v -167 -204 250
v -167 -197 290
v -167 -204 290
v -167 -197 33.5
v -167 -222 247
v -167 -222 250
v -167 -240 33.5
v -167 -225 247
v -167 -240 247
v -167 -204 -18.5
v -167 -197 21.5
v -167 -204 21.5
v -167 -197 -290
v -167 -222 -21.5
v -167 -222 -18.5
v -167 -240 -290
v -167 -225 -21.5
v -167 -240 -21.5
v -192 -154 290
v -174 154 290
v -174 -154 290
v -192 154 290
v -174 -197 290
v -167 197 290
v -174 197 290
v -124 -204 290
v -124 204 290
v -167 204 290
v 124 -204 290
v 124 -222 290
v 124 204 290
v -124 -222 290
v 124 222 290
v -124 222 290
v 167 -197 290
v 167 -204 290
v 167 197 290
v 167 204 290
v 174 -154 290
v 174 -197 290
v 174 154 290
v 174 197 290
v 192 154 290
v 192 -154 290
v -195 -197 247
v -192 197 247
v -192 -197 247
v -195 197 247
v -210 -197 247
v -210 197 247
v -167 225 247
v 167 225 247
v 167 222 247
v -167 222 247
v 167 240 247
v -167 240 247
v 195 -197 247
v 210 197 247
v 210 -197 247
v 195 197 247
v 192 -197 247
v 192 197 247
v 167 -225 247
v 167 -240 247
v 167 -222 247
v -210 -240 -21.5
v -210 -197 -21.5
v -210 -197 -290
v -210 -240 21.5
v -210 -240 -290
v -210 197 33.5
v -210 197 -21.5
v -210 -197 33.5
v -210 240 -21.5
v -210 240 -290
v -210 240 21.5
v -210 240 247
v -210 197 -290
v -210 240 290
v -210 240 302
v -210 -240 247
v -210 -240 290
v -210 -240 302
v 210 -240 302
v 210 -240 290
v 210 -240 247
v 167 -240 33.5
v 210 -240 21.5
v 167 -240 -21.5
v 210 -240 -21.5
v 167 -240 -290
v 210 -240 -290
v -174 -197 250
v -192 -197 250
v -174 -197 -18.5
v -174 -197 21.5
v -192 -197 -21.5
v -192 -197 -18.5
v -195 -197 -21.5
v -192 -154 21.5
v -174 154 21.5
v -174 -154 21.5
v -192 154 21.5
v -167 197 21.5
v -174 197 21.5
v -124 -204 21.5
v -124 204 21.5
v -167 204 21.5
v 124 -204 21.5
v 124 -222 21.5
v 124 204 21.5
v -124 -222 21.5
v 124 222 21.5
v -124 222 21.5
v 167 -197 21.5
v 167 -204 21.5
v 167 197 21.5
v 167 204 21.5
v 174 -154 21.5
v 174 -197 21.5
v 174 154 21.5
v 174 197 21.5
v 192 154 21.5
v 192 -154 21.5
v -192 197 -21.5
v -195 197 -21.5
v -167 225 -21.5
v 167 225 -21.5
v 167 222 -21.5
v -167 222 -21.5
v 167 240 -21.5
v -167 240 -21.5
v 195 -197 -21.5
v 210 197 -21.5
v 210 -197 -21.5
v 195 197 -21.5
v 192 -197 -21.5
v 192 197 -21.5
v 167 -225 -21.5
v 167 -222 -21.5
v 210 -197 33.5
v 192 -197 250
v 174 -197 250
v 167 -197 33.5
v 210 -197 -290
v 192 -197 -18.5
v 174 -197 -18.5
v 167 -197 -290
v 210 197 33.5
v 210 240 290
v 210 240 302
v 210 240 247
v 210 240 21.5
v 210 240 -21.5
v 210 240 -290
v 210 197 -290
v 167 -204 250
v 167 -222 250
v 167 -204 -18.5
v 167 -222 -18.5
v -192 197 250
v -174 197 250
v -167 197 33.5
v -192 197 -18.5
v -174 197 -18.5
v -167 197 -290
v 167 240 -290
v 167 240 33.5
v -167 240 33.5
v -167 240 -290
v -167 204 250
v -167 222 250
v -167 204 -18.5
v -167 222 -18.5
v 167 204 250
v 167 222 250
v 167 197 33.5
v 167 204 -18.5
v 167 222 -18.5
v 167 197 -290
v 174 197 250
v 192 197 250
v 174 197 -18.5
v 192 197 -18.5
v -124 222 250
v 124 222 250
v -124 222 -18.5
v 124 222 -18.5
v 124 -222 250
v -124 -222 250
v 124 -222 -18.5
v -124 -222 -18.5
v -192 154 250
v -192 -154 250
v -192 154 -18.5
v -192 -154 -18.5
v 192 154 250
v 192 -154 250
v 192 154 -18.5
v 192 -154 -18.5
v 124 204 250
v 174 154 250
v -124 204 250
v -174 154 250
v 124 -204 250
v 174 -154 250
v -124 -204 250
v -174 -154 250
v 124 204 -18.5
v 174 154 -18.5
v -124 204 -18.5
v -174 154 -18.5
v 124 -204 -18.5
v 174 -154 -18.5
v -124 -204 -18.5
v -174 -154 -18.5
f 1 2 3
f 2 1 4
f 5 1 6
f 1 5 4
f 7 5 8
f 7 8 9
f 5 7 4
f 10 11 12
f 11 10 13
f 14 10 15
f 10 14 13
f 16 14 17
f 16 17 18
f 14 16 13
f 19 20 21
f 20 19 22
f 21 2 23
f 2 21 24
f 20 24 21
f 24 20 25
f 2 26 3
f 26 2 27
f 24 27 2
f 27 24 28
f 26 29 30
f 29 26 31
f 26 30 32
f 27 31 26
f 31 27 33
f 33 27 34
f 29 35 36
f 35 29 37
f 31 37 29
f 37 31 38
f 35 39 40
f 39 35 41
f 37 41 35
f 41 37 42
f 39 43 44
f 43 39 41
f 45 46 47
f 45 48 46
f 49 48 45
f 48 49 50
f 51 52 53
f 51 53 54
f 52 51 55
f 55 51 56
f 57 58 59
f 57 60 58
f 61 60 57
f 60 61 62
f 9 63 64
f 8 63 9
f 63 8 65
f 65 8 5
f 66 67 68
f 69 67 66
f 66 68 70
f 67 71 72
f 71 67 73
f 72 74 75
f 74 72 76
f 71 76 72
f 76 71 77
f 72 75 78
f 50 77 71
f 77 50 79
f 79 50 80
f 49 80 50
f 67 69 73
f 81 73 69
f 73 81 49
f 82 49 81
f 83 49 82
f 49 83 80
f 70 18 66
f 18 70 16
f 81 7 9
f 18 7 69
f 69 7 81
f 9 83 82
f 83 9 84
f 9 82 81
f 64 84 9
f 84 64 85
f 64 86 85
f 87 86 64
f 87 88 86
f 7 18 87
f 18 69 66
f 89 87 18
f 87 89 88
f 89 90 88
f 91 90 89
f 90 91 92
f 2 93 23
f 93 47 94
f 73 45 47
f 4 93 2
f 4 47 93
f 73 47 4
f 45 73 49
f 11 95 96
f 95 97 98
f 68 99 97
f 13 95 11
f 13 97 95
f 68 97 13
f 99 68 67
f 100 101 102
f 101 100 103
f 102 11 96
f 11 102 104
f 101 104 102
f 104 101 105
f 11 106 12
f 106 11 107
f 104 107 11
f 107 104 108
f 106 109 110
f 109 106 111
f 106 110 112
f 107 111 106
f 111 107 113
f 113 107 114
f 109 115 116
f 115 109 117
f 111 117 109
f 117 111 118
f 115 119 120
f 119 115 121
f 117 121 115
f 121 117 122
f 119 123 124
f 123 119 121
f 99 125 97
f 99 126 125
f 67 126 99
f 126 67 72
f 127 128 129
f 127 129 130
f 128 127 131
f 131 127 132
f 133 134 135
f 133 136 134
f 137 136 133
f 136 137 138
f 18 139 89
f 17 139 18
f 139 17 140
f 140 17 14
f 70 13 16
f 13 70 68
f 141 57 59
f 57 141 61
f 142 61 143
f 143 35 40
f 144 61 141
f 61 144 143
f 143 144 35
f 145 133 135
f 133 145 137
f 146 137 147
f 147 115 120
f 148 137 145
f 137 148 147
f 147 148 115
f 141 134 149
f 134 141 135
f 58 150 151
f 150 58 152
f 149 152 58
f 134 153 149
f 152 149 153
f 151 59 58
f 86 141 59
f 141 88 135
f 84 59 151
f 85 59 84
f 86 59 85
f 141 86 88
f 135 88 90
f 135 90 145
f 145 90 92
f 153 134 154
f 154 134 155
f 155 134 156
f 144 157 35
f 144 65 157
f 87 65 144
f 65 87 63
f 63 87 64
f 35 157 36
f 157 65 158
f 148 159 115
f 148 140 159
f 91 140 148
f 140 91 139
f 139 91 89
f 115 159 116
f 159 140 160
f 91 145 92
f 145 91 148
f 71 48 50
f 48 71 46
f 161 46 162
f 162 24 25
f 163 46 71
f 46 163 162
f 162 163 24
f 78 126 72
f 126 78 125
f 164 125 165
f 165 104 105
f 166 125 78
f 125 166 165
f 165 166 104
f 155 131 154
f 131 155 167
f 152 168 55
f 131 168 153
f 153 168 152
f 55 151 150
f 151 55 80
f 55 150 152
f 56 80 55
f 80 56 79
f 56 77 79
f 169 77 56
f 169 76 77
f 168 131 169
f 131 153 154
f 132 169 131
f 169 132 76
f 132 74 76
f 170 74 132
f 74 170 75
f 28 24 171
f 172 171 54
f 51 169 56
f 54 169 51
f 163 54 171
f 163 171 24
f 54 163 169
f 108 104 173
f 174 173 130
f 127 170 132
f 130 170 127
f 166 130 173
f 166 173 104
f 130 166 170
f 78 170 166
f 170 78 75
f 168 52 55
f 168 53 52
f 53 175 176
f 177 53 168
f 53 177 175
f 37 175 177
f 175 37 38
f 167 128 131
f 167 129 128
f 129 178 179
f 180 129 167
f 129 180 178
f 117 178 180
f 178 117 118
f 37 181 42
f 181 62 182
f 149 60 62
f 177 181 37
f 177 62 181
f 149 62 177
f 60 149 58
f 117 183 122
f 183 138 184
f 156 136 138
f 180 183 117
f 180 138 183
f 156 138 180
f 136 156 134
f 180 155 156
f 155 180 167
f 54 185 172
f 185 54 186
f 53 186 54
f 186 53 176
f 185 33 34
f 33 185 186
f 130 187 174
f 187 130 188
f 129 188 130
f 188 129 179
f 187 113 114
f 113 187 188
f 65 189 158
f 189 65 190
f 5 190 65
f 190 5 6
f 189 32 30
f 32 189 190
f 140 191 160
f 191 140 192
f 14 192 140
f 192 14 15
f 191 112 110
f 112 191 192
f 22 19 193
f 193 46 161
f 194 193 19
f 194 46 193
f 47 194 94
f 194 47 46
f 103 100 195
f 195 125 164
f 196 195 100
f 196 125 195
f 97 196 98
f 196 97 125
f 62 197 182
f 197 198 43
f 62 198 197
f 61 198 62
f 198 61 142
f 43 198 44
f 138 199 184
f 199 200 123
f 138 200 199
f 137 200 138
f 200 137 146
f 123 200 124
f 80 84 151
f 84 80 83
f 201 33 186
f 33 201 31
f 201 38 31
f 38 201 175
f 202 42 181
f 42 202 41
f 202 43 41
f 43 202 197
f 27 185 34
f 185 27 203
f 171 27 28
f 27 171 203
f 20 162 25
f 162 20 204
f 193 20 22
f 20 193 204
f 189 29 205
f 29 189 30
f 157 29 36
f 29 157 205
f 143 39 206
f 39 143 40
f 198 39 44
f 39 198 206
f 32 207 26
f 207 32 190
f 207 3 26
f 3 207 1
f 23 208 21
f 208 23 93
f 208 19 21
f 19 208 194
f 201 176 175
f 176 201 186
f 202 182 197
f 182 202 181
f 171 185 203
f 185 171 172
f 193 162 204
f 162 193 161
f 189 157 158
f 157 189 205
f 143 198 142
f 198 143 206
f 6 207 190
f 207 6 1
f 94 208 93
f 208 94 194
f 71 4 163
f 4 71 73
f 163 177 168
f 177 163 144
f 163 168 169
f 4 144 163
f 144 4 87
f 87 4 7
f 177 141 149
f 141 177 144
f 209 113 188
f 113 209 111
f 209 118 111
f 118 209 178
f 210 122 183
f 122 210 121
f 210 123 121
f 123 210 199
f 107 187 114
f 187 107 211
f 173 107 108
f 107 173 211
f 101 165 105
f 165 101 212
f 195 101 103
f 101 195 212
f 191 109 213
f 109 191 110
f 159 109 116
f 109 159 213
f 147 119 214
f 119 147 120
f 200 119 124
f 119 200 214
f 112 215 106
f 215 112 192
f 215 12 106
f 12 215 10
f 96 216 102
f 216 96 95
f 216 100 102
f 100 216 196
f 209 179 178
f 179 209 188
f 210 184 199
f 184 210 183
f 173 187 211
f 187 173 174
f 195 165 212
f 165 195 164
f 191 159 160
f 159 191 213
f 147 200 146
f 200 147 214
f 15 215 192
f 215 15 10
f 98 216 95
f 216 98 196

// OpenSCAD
// file: shelf.scad
module shelf(table_width,table_depth,shelf_thickness,strut_timber_width,strut_timber_depth,leg_timber_width, lap_depth,brace_length)
{
    difference()
    {
      cube([table_width,table_depth,shelf_thickness],true);
    	
    	//Corner cutouts
    	//Back Right
    	translate([table_width/2-leg_timber_width/2,
    						 table_depth/2-leg_timber_width/2,
    						 0])
    	{
    		#cube([leg_timber_width,leg_timber_width,shelf_thickness],true);
    	}

    	//Back Left    	
    	translate([(table_width/2-leg_timber_width/2)*-1,
    							table_depth/2-leg_timber_width/2,
    							0])
    	{
    		#cube([leg_timber_width,leg_timber_width,shelf_thickness],true);
    	}    
    	
    	//Front Right
    	translate([table_width/2-leg_timber_width/2,
    						 (table_depth/2-leg_timber_width/2)*-1,
    						 0])
    	{
    		#cube([leg_timber_width,leg_timber_width,shelf_thickness],true);
    	}    	

    	//Front Left
    	translate([(table_width/2-leg_timber_width/2)*-1,
    						 (table_depth/2-leg_timber_width/2)*-1,0])
    	{
    		#cube([leg_timber_width,leg_timber_width,shelf_thickness],true);
    	}
    	
    	//Back Right - x-parallel
    	translate([table_width/2 - brace_length/2 - leg_timber_width,
    						table_depth/2 - strut_timber_depth/2 - strut_timber_depth,
    						-shelf_thickness/2 + shelf_thickness/4/2])
    	{
				cube([brace_length,strut_timber_depth,shelf_thickness/4],true);
			}
			
			//Back right y-parallel
		  translate([table_width/2 - strut_timber_depth/2 - strut_timber_depth,
    						table_depth/2 - brace_length/2 - leg_timber_width,
    						-shelf_thickness/2 + shelf_thickness/4/2])
    	{
				cube([strut_timber_depth,brace_length,shelf_thickness/4],true);
			}
			
			
			//Back Left - x-parallel
    	translate([(table_width/2 - brace_length/2 - leg_timber_width)*-1,
    						table_depth/2 - strut_timber_depth/2 - strut_timber_depth,
    						-shelf_thickness/2 + shelf_thickness/4/2])
    	{
				cube([brace_length,strut_timber_depth,shelf_thickness/4],true);
			}
			
			//Back Left y-parallel
		  translate([(table_width/2 - strut_timber_depth/2 - strut_timber_depth)*-1,
    						table_depth/2 - brace_length/2 - leg_timber_width,
    						-shelf_thickness/2 + shelf_thickness/4/2])
    	{
				cube([strut_timber_depth,brace_length,shelf_thickness/4],true);
			}
			
			
			//Front Right - x-parallel
    	translate([table_width/2 - brace_length/2 - leg_timber_width,
    						(table_depth/2 - strut_timber_depth/2 - strut_timber_depth)*-1,
    						-shelf_thickness/2 + shelf_thickness/4/2])
    	{
				cube([brace_length,strut_timber_depth,shelf_thickness/4],true);
			}
			
			//Back right y-parallel
		  translate([table_width/2 - strut_timber_depth/2 - strut_timber_depth,
    						(table_depth/2 - brace_length/2 - leg_timber_width)*-1,
    						-shelf_thickness/2 + shelf_thickness/4/2])
    	{
				cube([strut_timber_depth,brace_length,shelf_thickness/4],true);
			}
			
			
			//Front Left - x-parallel
    	translate([(table_width/2 - brace_length/2 - leg_timber_width)*-1,
    						(table_depth/2 - strut_timber_depth/2 - strut_timber_depth)*-1,
    						-shelf_thickness/2 + shelf_thickness/4/2])
    	{
				cube([brace_length,strut_timber_depth,shelf_thickness/4],true);
			}
			
			//Front Left y-parallel
		  translate([(table_width/2 - strut_timber_depth/2 - strut_timber_depth)*-1,
    						(table_depth/2 - brace_length/2 - leg_timber_width)*-1,
    						-shelf_thickness/2 + shelf_thickness/4/2])
    	{
				cube([strut_timber_depth,brace_length,shelf_thickness/4],true);
			}

		}
		
		//Back Right x-parallel
		translate([table_width/2 - brace_length/2 - leg_timber_width,
    						table_depth/2 - strut_timber_depth/2 - strut_timber_depth,
    						-strut_timber_width/2-shelf_thickness/4])
    {
			cube([brace_length,strut_timber_depth,strut_timber_width],true);
		}
		
		// Back right y-parallel
		translate([table_width/2 - strut_timber_depth/2 - strut_timber_depth,
    						table_depth/2 - brace_length/2 - leg_timber_width,
    						-strut_timber_width/2-shelf_thickness/4])
    {
			cube([strut_timber_depth,brace_length,strut_timber_width],true);
		}
		
		//Back Left x-parallel
		translate([(table_width/2 - brace_length/2 - leg_timber_width)*-1,
    						table_depth/2 - strut_timber_depth/2 - strut_timber_depth,
    						-strut_timber_width/2-shelf_thickness/4])
    {
			cube([brace_length,strut_timber_depth,strut_timber_width],true);
		}
		
		// Back Left y-parallel
		translate([(table_width/2 - strut_timber_depth/2 - strut_timber_depth)*-1,
    						table_depth/2 - brace_length/2 - leg_timber_width,
    						-strut_timber_width/2-shelf_thickness/4])
    {
			cube([strut_timber_depth,brace_length,strut_timber_width],true);
		}
		
		
		//Front Right x-parallel
		translate([table_width/2 - brace_length/2 - leg_timber_width,
    						(table_depth/2 - strut_timber_depth/2 - strut_timber_depth)*-1,
    						-strut_timber_width/2-shelf_thickness/4])
    {
			cube([brace_length,strut_timber_depth,strut_timber_width],true);
		}
		
		// Front right y-parallel
		translate([table_width/2 - strut_timber_depth/2 - strut_timber_depth,
    						(table_depth/2 - brace_length/2 - leg_timber_width)*-1,
    						-strut_timber_width/2-shelf_thickness/4])
    {
			cube([strut_timber_depth,brace_length,strut_timber_width],true);
		}
		
		//Front Left x-parallel
		translate([(table_width/2 - brace_length/2 - leg_timber_width)*-1,
    						(table_depth/2 - strut_timber_depth/2 - strut_timber_depth)*-1,
    						-strut_timber_width/2-shelf_thickness/4])
    {
			cube([brace_length,strut_timber_depth,strut_timber_width],true);
		}
		
		//Front Left y-parallel
		translate([(table_width/2 - strut_timber_depth/2 - strut_timber_depth)*-1,
    						(table_depth/2 - brace_length/2 - leg_timber_width)*-1,
    						-strut_timber_width/2-shelf_thickness/4])
    {
			cube([strut_timber_depth,brace_length,strut_timber_width],true);
		}
}
top(500,300,12,43,17,43,15,43);
// file: top.scad
module top(table_width,table_depth,shelf_thickness,strut_timber_width,strut_timber_depth,leg_timber_width, lap_depth,brace_length)
{
    difference()
    {
      cube([table_width,table_depth,shelf_thickness],true);
    	
    	//Back Right - x-parallel
    	translate([table_width/2 - brace_length/2 - leg_timber_width,
    						table_depth/2 - strut_timber_depth/2 - strut_timber_depth,
    						-shelf_thickness/2 + shelf_thickness/4/2])
    	{
				cube([brace_length,strut_timber_depth,shelf_thickness/4],true);
			}
			
			//Back right y-parallel
		  translate([table_width/2 - strut_timber_depth/2 - strut_timber_depth,
    						table_depth/2 - brace_length/2 - leg_timber_width,
    						-shelf_thickness/2 + shelf_thickness/4/2])
    	{
				cube([strut_timber_depth,brace_length,shelf_thickness/4],true);
			}
			
			
			//Back Left - x-parallel
    	translate([(table_width/2 - brace_length/2 - leg_timber_width)*-1,
    						table_depth/2 - strut_timber_depth/2 - strut_timber_depth,
    						-shelf_thickness/2 + shelf_thickness/4/2])
    	{
				cube([brace_length,strut_timber_depth,shelf_thickness/4],true);
			}
			
			//Back Left y-parallel
		  translate([(table_width/2 - strut_timber_depth/2 - strut_timber_depth)*-1,
    						table_depth/2 - brace_length/2 - leg_timber_width,
    						-shelf_thickness/2 + shelf_thickness/4/2])
    	{
				cube([strut_timber_depth,brace_length,shelf_thickness/4],true);
			}
			
			
			//Front Right - x-parallel
    	translate([table_width/2 - brace_length/2 - leg_timber_width,
    						(table_depth/2 - strut_timber_depth/2 - strut_timber_depth)*-1,
    						-shelf_thickness/2 + shelf_thickness/4/2])
    	{
				cube([brace_length,strut_timber_depth,shelf_thickness/4],true);
			}
			
			//Back right y-parallel
		  translate([table_width/2 - strut_timber_depth/2 - strut_timber_depth,
    						(table_depth/2 - brace_length/2 - leg_timber_width)*-1,
    						-shelf_thickness/2 + shelf_thickness/4/2])
    	{
				cube([strut_timber_depth,brace_length,shelf_thickness/4],true);
			}
			
			
			//Front Left - x-parallel
    	translate([(table_width/2 - brace_length/2 - leg_timber_width)*-1,
    						(table_depth/2 - strut_timber_depth/2 - strut_timber_depth)*-1,
    						-shelf_thickness/2 + shelf_thickness/4/2])
    	{
				cube([brace_length,strut_timber_depth,shelf_thickness/4],true);
			}
			
			//Front Left y-parallel
		  translate([(table_width/2 - strut_timber_depth/2 - strut_timber_depth)*-1,
    						(table_depth/2 - brace_length/2 - leg_timber_width)*-1,
    						-shelf_thickness/2 + shelf_thickness/4/2])
    	{
				cube([strut_timber_depth,brace_length,shelf_thickness/4],true);
			}

		}
		
		//Back Right x-parallel
		translate([table_width/2 - brace_length/2 - leg_timber_width,
    						table_depth/2 - strut_timber_depth/2 - strut_timber_depth,
    						-strut_timber_width/2-shelf_thickness/4])
    {
			cube([brace_length,strut_timber_depth,strut_timber_width],true);
		}
		
		// Back right y-parallel
		translate([table_width/2 - strut_timber_depth/2 - strut_timber_depth,
    						table_depth/2 - brace_length/2 - leg_timber_width,
    						-strut_timber_width/2-shelf_thickness/4])
    {
			cube([strut_timber_depth,brace_length,strut_timber_width],true);
		}
		
		//Back Left x-parallel
		translate([(table_width/2 - brace_length/2 - leg_timber_width)*-1,
    						table_depth/2 - strut_timber_depth/2 - strut_timber_depth,
    						-strut_timber_width/2-shelf_thickness/4])
    {
			cube([brace_length,strut_timber_depth,strut_timber_width],true);
		}
		
		// Back Left y-parallel
		translate([(table_width/2 - strut_timber_depth/2 - strut_timber_depth)*-1,
    						table_depth/2 - brace_length/2 - leg_timber_width,
    						-strut_timber_width/2-shelf_thickness/4])
    {
			cube([strut_timber_depth,brace_length,strut_timber_width],true);
		}
		
		
		//Front Right x-parallel
		translate([table_width/2 - brace_length/2 - leg_timber_width,
    						(table_depth/2 - strut_timber_depth/2 - strut_timber_depth)*-1,
    						-strut_timber_width/2-shelf_thickness/4])
    {
			cube([brace_length,strut_timber_depth,strut_timber_width],true);
		}
		
		// Front right y-parallel
		translate([table_width/2 - strut_timber_depth/2 - strut_timber_depth,
    						(table_depth/2 - brace_length/2 - leg_timber_width)*-1,
    						-strut_timber_width/2-shelf_thickness/4])
    {
			cube([strut_timber_depth,brace_length,strut_timber_width],true);
		}
		
		//Front Left x-parallel
		translate([(table_width/2 - brace_length/2 - leg_timber_width)*-1,
    						(table_depth/2 - strut_timber_depth/2 - strut_timber_depth)*-1,
    						-strut_timber_width/2-shelf_thickness/4])
    {
			cube([brace_length,strut_timber_depth,strut_timber_width],true);
		}
		
		//Front Left y-parallel
		translate([(table_width/2 - strut_timber_depth/2 - strut_timber_depth)*-1,
    						(table_depth/2 - brace_length/2 - leg_timber_width)*-1,
    						-strut_timber_width/2-shelf_thickness/4])
    {
			cube([strut_timber_depth,brace_length,strut_timber_width],true);
		}
}
top(500,300,12,43,17,43,15,43);
// file: strut.scad
module strut(lap_depth,leg_timber_width,strut_timber_width,strut_timber_depth,strut_length )
{
    difference()
    {
        cube([strut_length,strut_timber_depth,strut_timber_width],true);
       
        // Left cutout 
        translate([-strut_length/2+strut_timber_width/2,(strut_timber_depth)/2-(strut_timber_depth-lap_depth)/2,0])
        {
            cube([leg_timber_width,strut_timber_depth-lap_depth,strut_timber_width],true);
        }
        translate([-strut_length/2,-strut_timber_depth/2,-strut_timber_width/2])
        {
            rotate([0,0,45])
            {
                cube([sqrt(pow(strut_timber_depth, 2) + pow(strut_timber_depth, 2)), strut_timber_depth, strut_timber_width], false);
            }
        }
    
        // Right cutout    
        translate([strut_length/2-strut_timber_width/2,(strut_timber_depth)/2-(strut_timber_depth-lap_depth)/2,0])
        {
            cube([leg_timber_width,strut_timber_depth-lap_depth,strut_timber_width],true);
        }
        mirror([1,0,0]){
            translate([-strut_length/2,-strut_timber_depth/2,-strut_timber_width/2])
            {
                rotate([0,0,45])
                {
                    cube([sqrt(pow(strut_timber_depth, 2) + pow(strut_timber_depth, 2)), strut_timber_depth, strut_timber_width], false);
                }
            }
        }
    }
}
// file: leg.scad
module leg(leg_length,lap_depth,leg_timber_width,strut_timber_width,shelf_height )
{
    difference()
    {
        cube([leg_timber_width,leg_timber_width,leg_length],true);
        
        // Top tenons
        translate([0,0,(leg_length-strut_timber_width)/2])
        {
            translate([0,-((leg_timber_width-lap_depth)/2),0]){
                cube([leg_timber_width,lap_depth,strut_timber_width],true);
            }
            translate([-((leg_timber_width-lap_depth)/2),0,0]){
                cube([lap_depth,leg_timber_width,strut_timber_width],true);
            }
        }
        
        // Shelf tenons
        translate([0,0,shelf_height-leg_length/2+strut_timber_width/2]){
            translate([0,-((leg_timber_width-lap_depth)/2),0]){
                cube([leg_timber_width,lap_depth,strut_timber_width],true);
            }
            translate([-((leg_timber_width-lap_depth)/2),0,0]){
                cube([lap_depth,leg_timber_width,strut_timber_width],true);
            }
        }
    }
}
// file: config.scad
leg_length=580;
leg_timber_width=43;
strut_timber_width=43;
strut_timber_depth=18;
lap_depth=15;
table_width=420;
table_depth=480;
shelf_thickness=12;
shelf_height=(leg_length-strut_timber_width)/2;
// main file
include <config.scad>
use <leg.scad>
use <strut.scad>
use <top.scad>
use <shelf.scad>

//Leg
translate([-table_width/2+leg_timber_width/2,-table_depth/2+leg_timber_width/2,0])
{
    leg(leg_length,lap_depth,leg_timber_width,strut_timber_width,shelf_height);
}

//Leg
translate([table_width/2-leg_timber_width/2,-table_depth/2+leg_timber_width/2,0]){
    rotate([0,0,90]){
        leg(leg_length,lap_depth,leg_timber_width,strut_timber_width,shelf_height);
    }
}

//Leg
translate([-table_width/2+leg_timber_width/2,table_depth/2-leg_timber_width/2,0]){
    rotate([0,0,-90]){
        leg(leg_length,lap_depth,leg_timber_width,strut_timber_width,shelf_height);
    }
}

//Leg
translate([table_width/2-leg_timber_width/2,table_depth/2-leg_timber_width/2,0]){
    rotate([0,0,180]){
        leg(leg_length,lap_depth,leg_timber_width,strut_timber_width,shelf_height);
    }
}


//Back High narrow strut
translate([0,table_depth/2-strut_timber_depth/2,leg_length/2-strut_timber_width/2])
{
    rotate([180,0,0]){
        strut(lap_depth,leg_timber_width,strut_timber_width,strut_timber_depth,table_width);
    }
}

//Back low narrow strut
translate([0,table_depth/2-strut_timber_depth/2, shelf_height-leg_length/2+strut_timber_width/2])
{
    rotate([180,0,0]){
        strut(lap_depth,leg_timber_width,strut_timber_width,strut_timber_depth,table_width);
    }
}


//Front high narrow strut
translate([0,-table_depth/2+strut_timber_depth/2,leg_length/2-strut_timber_width/2])
{
    rotate([0,0,0]){
        strut(lap_depth,leg_timber_width,strut_timber_width,strut_timber_depth,table_width);
    }
}

//Back low narrow strut
translate([0,-table_depth/2+strut_timber_depth/2, shelf_height-leg_length/2+strut_timber_width/2])
{
    rotate([0,0,0]){
        strut(lap_depth,leg_timber_width,strut_timber_width,strut_timber_depth,table_width);
    }
}



//Left high narrow strut
translate([-table_width/2+strut_timber_depth/2,0,leg_length/2-strut_timber_width/2])
{
    rotate([180,0,90]){
        strut(lap_depth,leg_timber_width,strut_timber_width,strut_timber_depth,table_depth);
    }
}

//Left low narrow strut
translate([-table_width/2+strut_timber_depth/2, 0, shelf_height-leg_length/2+strut_timber_width/2])
{
    rotate([180,0,90]){
        strut(lap_depth,leg_timber_width,strut_timber_width,strut_timber_depth,table_depth);
    }
}


//Left high narrow strut
translate([table_width/2-strut_timber_depth/2,0,leg_length/2-strut_timber_width/2])
{
    rotate([0,0,90]){
        strut(lap_depth,leg_timber_width,strut_timber_width,strut_timber_depth,table_depth);
    }
}

//Left low narrow strut
translate([table_width/2-strut_timber_depth/2, 0, shelf_height-leg_length/2+strut_timber_width/2])
{
    rotate([0,0,90]){
        strut(lap_depth,leg_timber_width,strut_timber_width,strut_timber_depth,table_depth);
    }
}

//Top
translate([0,0,leg_length/2+shelf_thickness/2]){
    top(table_width,table_depth,shelf_thickness,strut_timber_width,strut_timber_depth,leg_timber_width, lap_depth,43);
}

//Top
translate([0,0,shelf_height-leg_length/2+strut_timber_width+shelf_thickness/2]){
    shelf(table_width,table_depth,shelf_thickness,strut_timber_width,strut_timber_depth,leg_timber_width, lap_depth,43);
}
